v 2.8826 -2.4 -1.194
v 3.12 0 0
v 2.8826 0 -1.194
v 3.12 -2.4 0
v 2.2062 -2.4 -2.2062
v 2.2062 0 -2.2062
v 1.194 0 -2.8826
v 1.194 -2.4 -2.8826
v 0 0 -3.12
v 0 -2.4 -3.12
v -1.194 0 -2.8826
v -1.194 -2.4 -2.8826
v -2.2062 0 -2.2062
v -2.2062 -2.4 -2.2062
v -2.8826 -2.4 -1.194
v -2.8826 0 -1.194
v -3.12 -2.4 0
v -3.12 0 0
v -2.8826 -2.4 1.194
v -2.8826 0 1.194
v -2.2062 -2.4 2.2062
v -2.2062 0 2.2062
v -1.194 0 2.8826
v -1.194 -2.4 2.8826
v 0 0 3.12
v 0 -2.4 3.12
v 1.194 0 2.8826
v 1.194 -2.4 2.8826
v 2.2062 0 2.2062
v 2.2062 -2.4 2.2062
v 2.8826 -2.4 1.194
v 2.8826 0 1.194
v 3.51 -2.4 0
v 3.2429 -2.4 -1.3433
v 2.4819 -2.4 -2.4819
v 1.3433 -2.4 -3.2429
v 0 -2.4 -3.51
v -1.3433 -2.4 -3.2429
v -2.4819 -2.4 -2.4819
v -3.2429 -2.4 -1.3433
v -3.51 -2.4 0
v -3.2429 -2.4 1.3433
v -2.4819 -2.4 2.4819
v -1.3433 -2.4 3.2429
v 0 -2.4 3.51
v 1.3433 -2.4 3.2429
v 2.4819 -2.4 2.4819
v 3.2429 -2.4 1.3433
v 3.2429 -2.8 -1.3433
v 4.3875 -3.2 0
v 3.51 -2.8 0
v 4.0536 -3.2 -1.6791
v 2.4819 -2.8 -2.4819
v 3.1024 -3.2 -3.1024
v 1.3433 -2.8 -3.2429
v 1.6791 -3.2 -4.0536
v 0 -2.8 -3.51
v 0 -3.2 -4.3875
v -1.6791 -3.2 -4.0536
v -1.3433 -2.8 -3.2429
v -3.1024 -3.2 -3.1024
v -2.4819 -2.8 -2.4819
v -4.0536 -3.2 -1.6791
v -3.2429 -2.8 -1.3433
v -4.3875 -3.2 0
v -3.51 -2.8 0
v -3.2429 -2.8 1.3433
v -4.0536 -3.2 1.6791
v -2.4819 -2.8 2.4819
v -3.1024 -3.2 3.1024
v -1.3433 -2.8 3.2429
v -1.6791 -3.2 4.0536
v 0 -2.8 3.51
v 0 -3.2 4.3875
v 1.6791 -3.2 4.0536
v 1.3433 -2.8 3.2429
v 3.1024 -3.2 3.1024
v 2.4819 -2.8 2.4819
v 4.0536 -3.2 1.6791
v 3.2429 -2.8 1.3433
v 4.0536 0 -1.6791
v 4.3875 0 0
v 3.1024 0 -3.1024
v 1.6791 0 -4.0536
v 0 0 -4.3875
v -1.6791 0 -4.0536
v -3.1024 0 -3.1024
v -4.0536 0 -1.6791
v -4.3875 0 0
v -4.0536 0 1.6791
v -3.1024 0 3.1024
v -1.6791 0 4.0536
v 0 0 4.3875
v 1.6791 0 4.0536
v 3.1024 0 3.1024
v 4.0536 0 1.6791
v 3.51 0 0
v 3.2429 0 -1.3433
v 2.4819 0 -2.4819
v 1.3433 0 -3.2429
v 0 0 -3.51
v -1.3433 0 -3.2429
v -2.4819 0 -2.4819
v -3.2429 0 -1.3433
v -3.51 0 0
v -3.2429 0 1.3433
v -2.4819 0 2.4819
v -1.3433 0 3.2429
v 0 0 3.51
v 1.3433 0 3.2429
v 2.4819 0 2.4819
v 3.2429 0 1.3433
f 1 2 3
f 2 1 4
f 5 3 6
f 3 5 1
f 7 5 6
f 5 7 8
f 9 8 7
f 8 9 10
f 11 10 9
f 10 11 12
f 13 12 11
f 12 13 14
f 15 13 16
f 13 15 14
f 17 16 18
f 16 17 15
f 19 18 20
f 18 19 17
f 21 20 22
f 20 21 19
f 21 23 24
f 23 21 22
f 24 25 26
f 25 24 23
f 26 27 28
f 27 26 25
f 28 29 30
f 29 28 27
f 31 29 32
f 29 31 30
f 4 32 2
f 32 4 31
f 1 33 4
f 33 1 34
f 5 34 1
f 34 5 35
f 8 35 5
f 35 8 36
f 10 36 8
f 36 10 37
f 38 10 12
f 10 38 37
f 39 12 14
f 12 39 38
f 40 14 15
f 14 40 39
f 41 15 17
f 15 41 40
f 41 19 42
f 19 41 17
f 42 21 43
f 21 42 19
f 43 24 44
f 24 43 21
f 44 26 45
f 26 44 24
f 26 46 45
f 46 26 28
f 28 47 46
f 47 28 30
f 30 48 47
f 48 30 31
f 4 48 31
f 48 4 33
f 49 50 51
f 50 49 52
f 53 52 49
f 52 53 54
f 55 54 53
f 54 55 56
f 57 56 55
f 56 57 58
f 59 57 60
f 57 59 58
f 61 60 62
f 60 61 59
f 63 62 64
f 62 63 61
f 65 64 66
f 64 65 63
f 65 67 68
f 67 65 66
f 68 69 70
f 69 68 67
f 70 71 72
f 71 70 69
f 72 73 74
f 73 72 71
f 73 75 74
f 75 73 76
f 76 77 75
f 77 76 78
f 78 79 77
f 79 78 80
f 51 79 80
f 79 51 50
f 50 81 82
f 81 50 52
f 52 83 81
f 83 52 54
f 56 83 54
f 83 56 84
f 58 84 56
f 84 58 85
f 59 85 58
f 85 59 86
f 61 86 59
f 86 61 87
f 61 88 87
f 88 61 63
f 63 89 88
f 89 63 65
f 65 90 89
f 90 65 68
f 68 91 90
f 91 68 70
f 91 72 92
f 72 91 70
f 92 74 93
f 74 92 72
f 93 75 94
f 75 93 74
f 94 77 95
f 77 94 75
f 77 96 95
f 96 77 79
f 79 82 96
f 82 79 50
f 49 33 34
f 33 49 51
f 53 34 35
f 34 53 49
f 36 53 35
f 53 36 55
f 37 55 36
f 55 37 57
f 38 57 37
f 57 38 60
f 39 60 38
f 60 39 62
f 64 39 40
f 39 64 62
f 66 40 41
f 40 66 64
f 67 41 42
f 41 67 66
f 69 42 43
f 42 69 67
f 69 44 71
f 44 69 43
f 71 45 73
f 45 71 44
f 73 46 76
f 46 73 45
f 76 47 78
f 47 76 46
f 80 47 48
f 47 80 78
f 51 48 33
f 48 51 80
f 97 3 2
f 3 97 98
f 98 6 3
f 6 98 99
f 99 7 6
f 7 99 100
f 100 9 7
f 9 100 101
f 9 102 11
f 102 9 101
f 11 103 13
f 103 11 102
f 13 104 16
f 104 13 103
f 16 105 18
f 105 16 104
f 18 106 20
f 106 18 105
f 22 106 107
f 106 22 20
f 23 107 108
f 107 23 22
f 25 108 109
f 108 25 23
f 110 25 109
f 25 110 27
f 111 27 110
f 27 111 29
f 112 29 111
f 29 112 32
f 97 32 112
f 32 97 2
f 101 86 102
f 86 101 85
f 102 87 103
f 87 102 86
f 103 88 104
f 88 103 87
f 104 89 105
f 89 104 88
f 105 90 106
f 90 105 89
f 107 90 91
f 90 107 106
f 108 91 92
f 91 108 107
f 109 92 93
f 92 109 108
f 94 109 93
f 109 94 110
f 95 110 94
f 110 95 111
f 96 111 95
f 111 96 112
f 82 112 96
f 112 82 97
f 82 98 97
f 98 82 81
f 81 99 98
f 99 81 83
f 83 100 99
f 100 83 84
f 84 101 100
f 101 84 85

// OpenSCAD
// file: ../p/4-4disc.scad
use <../lib.scad>
$fa=1; $fs=0.2;
function ldraw_lib__4_4disc(realsolid=false) = [
// 0 Disc 1.0
// 0 Name: 4-4disc.dat
// 0 Author: James Jessiman
// 0 !LDRAW_ORG Primitive UPDATE 2002-02
// 0 !LICENSE Licensed under CC BY 2.0 and CC BY 4.0 : see CAreadme.txt
// 
// 0 BFC CERTIFY CCW
  [0,"BFC","CERTIFY"],
  [0,"BFC","CCW"],
// 
// 0 !HISTORY 1998-12-15 [PTadmin] Official Update 1998-10
// 0 !HISTORY 2002-03-23 [sbliss] Added BFC statement
// 0 !HISTORY 2002-04-25 [PTadmin] Official Update 2002-02
// 0 !HISTORY 2007-06-24 [PTadmin] Header formatted for Contributor Agreement
// 0 !HISTORY 2008-07-01 [PTadmin] Official Update 2008-01
// 
// 
// 3 16 0 0 0 1 0 0 0.9239 0 0.3827
  [3,16,0,0,0,1,0,0,0.9239,0,0.3827],
// 3 16 0 0 0 0.9239 0 0.3827 0.7071 0 0.7071
  [3,16,0,0,0,0.9239,0,0.3827,0.7071,0,0.7071],
// 3 16 0 0 0 0.7071 0 0.7071 0.3827 0 0.9239
  [3,16,0,0,0,0.7071,0,0.7071,0.3827,0,0.9239],
// 3 16 0 0 0 0.3827 0 0.9239 0 0 1
  [3,16,0,0,0,0.3827,0,0.9239,0,0,1],
// 3 16 0 0 0 0 0 1 -0.3827 0 0.9239
  [3,16,0,0,0,0,0,1,-0.3827,0,0.9239],
// 3 16 0 0 0 -0.3827 0 0.9239 -0.7071 0 0.7071
  [3,16,0,0,0,-0.3827,0,0.9239,-0.7071,0,0.7071],
// 3 16 0 0 0 -0.7071 0 0.7071 -0.9239 0 0.3827
  [3,16,0,0,0,-0.7071,0,0.7071,-0.9239,0,0.3827],
// 3 16 0 0 0 -0.9239 0 0.3827 -1 0 -0
  [3,16,0,0,0,-0.9239,0,0.3827,-1,0,-0],
// 3 16 0 0 0 -1 0 -0 -0.9239 0 -0.3827
  [3,16,0,0,0,-1,0,-0,-0.9239,0,-0.3827],
// 3 16 0 0 0 -0.9239 0 -0.3827 -0.7071 0 -0.7071
  [3,16,0,0,0,-0.9239,0,-0.3827,-0.7071,0,-0.7071],
// 3 16 0 0 0 -0.7071 0 -0.7071 -0.3827 0 -0.9239
  [3,16,0,0,0,-0.7071,0,-0.7071,-0.3827,0,-0.9239],
// 3 16 0 0 0 -0.3827 0 -0.9239 0 0 -1
  [3,16,0,0,0,-0.3827,0,-0.9239,0,0,-1],
// 3 16 0 0 0 0 0 -1 0.3827 0 -0.9239
  [3,16,0,0,0,0,0,-1,0.3827,0,-0.9239],
// 3 16 0 0 0 0.3827 0 -0.9239 0.7071 0 -0.7071
  [3,16,0,0,0,0.3827,0,-0.9239,0.7071,0,-0.7071],
// 3 16 0 0 0 0.7071 0 -0.7071 0.9239 0 -0.3827
  [3,16,0,0,0,0.7071,0,-0.7071,0.9239,0,-0.3827],
// 3 16 0 0 0 0.9239 0 -0.3827 1 0 0
  [3,16,0,0,0,0.9239,0,-0.3827,1,0,0],
// 0
];
module ldraw_lib__4_4disc(step=0, col=false, unit=2/5, alt=false, line=0.2, solid=!$preview)
    makepoly(ldraw_lib__4_4disc(solid), step=step, col=col, unit=unit, alt=alt, line=line, solid=solid);
ldraw_lib__4_4disc(line=0.2);
// file: ../p/stud3.scad
use <../lib.scad>
use <4-4cyli.scad>
use <4-4disc.scad>
use <4-4edge.scad>
$fa=1; $fs=0.2;
function ldraw_lib__stud3(realsolid=false) = realsolid ? 
    [openscad(translate([0,0,-eps()], o=cylinder(4+eps(), r=4)),2)] : [
// 0 Stud Tube Solid
// 0 Name: stud3.dat
// 0 Author: James Jessiman
// 0 !LDRAW_ORG Primitive UPDATE 2012-01
// 0 !LICENSE Licensed under CC BY 2.0 and CC BY 4.0 : see CAreadme.txt
// 
// 0 BFC CERTIFY CCW
  [0,"BFC","CERTIFY"],
  [0,"BFC","CCW"],
// 
// 0 !HISTORY 2002-04-04 [sbliss] Modified for BFC compliance
// 0 !HISTORY 2002-04-25 [PTadmin] Official Update 2002-02
// 0 !HISTORY 2007-06-24 [PTadmin] Header formatted for Contributor Agreement
// 0 !HISTORY 2008-07-01 [PTadmin] Official Update 2008-01
// 0 !HISTORY 2012-02-16 [Philo] Changed to CCW
// 0 !HISTORY 2012-03-30 [PTadmin] Official Update 2012-01
// 
// 
// 1 16 0 -4 0 4 0 0 0 1 0 0 0 4 4-4edge.dat
  [1,16,0,-4,0,4,0,0,0,1,0,0,0,4, ldraw_lib__4_4edge(realsolid)],
// 1 16 0 0 0 4 0 0 0 1 0 0 0 4 4-4edge.dat
  [1,16,0,0,0,4,0,0,0,1,0,0,0,4, ldraw_lib__4_4edge(realsolid)],
// 1 16 0 -4 0 4 0 0 0 1 0 0 0 4 4-4disc.dat
  [1,16,0,-4,0,4,0,0,0,1,0,0,0,4, ldraw_lib__4_4disc(realsolid)],
// 1 16 0 -4 0 4 0 0 0 4 0 0 0 4 4-4cyli.dat
  [1,16,0,-4,0,4,0,0,0,4,0,0,0,4, ldraw_lib__4_4cyli(realsolid)],
];
module ldraw_lib__stud3(step=0, col=false, unit=2/5, alt=false, line=0.2, solid=!$preview)
    makepoly(ldraw_lib__stud3(solid), step=step, col=col, unit=unit, alt=alt, line=line, solid=solid);
ldraw_lib__stud3(line=0.2);
// file: ../p/stud.scad
use <../lib.scad>
use <4-4cyli.scad>
use <4-4disc.scad>
use <4-4edge.scad>
$fa=1; $fs=0.2;
function ldraw_lib__stud(realsolid=false) = realsolid ? 
    [openscad(translate([0,0,-eps()], o=cylinder(4+eps(), r=6)),2)] : [
// 0 Stud
// 0 Name: stud.dat
// 0 Author: James Jessiman
// 0 !LDRAW_ORG Primitive UPDATE 2012-01
// 0 !LICENSE Licensed under CC BY 2.0 and CC BY 4.0 : see CAreadme.txt
// 
// 0 BFC CERTIFY CCW
  [0,"BFC","CERTIFY"],
  [0,"BFC","CCW"],
// 
// 0 !HISTORY 2002-04-04 [sbliss] Modified for BFC compliance
// 0 !HISTORY 2002-04-25 [PTadmin] Official Update 2002-02
// 0 !HISTORY 2007-06-24 [PTadmin] Header formatted for Contributor Agreement
// 0 !HISTORY 2008-07-01 [PTadmin] Official Update 2008-01
// 0 !HISTORY 2012-02-16 [Philo] Changed to CCW
// 0 !HISTORY 2012-03-30 [PTadmin] Official Update 2012-01
// 
// 
// 1 16 0 0 0 6 0 0 0 1 0 0 0 6 4-4edge.dat
  [1,16,0,0,0,6,0,0,0,1,0,0,0,6, ldraw_lib__4_4edge(realsolid)],
// 1 16 0 -4 0 6 0 0 0 1 0 0 0 6 4-4edge.dat
  [1,16,0,-4,0,6,0,0,0,1,0,0,0,6, ldraw_lib__4_4edge(realsolid)],
// 1 16 0 0 0 6 0 0 0 -4 0 0 0 6 4-4cyli.dat
  [1,16,0,0,0,6,0,0,0,-4,0,0,0,6, ldraw_lib__4_4cyli(realsolid)],
// 1 16 0 -4 0 6 0 0 0 1 0 0 0 6 4-4disc.dat
  [1,16,0,-4,0,6,0,0,0,1,0,0,0,6, ldraw_lib__4_4disc(realsolid)],
];
module ldraw_lib__stud(step=0, col=false, unit=2/5, alt=false, line=0.2, solid=!$preview)
    makepoly(ldraw_lib__stud(solid), step=step, col=col, unit=unit, alt=alt, line=line, solid=solid);
ldraw_lib__stud(line=0.2);
// file: ../p/box5.scad
use <../lib.scad>
$fa=1; $fs=0.2;
function ldraw_lib__box5(realsolid=false) = [
// 0 Box with 5 Faces and All Edges
// 0 Name: box5.dat
// 0 Author: James Jessiman
// 0 !LDRAW_ORG Primitive UPDATE 2012-01
// 0 !LICENSE Licensed under CC BY 2.0 and CC BY 4.0 : see CAreadme.txt
// 
// 0 BFC CERTIFY CCW
  [0,"BFC","CERTIFY"],
  [0,"BFC","CCW"],
// 
// 0 !HISTORY 2002-04-03 [sbliss] Modified for BFC compliance
// 0 !HISTORY 2002-04-25 [PTadmin] Official Update 2002-02
// 0 !HISTORY 2007-06-24 [PTadmin] Header formatted for Contributor Agreement
// 0 !HISTORY 2008-07-01 [PTadmin] Official Update 2008-01
// 0 !HISTORY 2012-02-16 [Philo] Changed to CCW
// 0 !HISTORY 2012-03-30 [PTadmin] Official Update 2012-01
// 
// 
// 2 24 1 1 1 -1 1 1
  [2,24,1,1,1,-1,1,1],
// 2 24 -1 1 1 -1 1 -1
  [2,24,-1,1,1,-1,1,-1],
// 2 24 -1 1 -1 1 1 -1
  [2,24,-1,1,-1,1,1,-1],
// 2 24 1 1 -1 1 1 1
  [2,24,1,1,-1,1,1,1],
// 2 24 1 0 1 -1 0 1
  [2,24,1,0,1,-1,0,1],
// 2 24 -1 0 1 -1 0 -1
  [2,24,-1,0,1,-1,0,-1],
// 2 24 -1 0 -1 1 0 -1
  [2,24,-1,0,-1,1,0,-1],
// 2 24 1 0 -1 1 0 1
  [2,24,1,0,-1,1,0,1],
// 2 24 1 0 1 1 1 1
  [2,24,1,0,1,1,1,1],
// 2 24 -1 0 1 -1 1 1
  [2,24,-1,0,1,-1,1,1],
// 2 24 1 0 -1 1 1 -1
  [2,24,1,0,-1,1,1,-1],
// 2 24 -1 0 -1 -1 1 -1
  [2,24,-1,0,-1,-1,1,-1],
// 4 16 -1 1 1 1 1 1 1 1 -1 -1 1 -1
  [4,16,-1,1,1,1,1,1,1,1,-1,-1,1,-1],
// 4 16 -1 1 1 -1 0 1 1 0 1 1 1 1
  [4,16,-1,1,1,-1,0,1,1,0,1,1,1,1],
// 4 16 -1 1 -1 -1 0 -1 -1 0 1 -1 1 1
  [4,16,-1,1,-1,-1,0,-1,-1,0,1,-1,1,1],
// 4 16 1 1 -1 1 0 -1 -1 0 -1 -1 1 -1
  [4,16,1,1,-1,1,0,-1,-1,0,-1,-1,1,-1],
// 4 16 1 1 1 1 0 1 1 0 -1 1 1 -1
  [4,16,1,1,1,1,0,1,1,0,-1,1,1,-1],
];
module ldraw_lib__box5(step=0, col=false, unit=2/5, alt=false, line=0.2, solid=!$preview)
    makepoly(ldraw_lib__box5(solid), step=step, col=col, unit=unit, alt=alt, line=line, solid=solid);
ldraw_lib__box5(line=0.2);
// file: ../p/box4t.scad
use <../lib.scad>
$fa=1; $fs=0.2;
function ldraw_lib__box4t(realsolid=false) = [
// 0 Box with 4 Adjacent Faces and All Edges
// 0 Name: box4t.dat
// 0 Author: Tore Eriksson [Tore_Eriksson]
// 0 !LDRAW_ORG Primitive UPDATE 2003-02
// 0 !LICENSE Licensed under CC BY 2.0 and CC BY 4.0 : see CAreadme.txt
// 
// 0 BFC CERTIFY CCW
  [0,"BFC","CERTIFY"],
  [0,"BFC","CCW"],
// 
// 0 !HISTORY 1997-09-29 [PTadmin] Official Update 1997-15
// 0 !HISTORY 2002-08-31 [izanette] Modified with WINDZ for BFC compliance
// 0 !HISTORY 2003-08-01 [PTadmin] Official Update 2003-02
// 0 !HISTORY 2007-06-24 [PTadmin] Header formatted for Contributor Agreement
// 0 !HISTORY 2008-07-01 [PTadmin] Official Update 2008-01
// 
// 
// 2 24 1 1 1 -1 1 1
  [2,24,1,1,1,-1,1,1],
// 2 24 -1 1 1 -1 1 -1
  [2,24,-1,1,1,-1,1,-1],
// 2 24 -1 1 -1 1 1 -1
  [2,24,-1,1,-1,1,1,-1],
// 2 24 1 1 -1 1 1 1
  [2,24,1,1,-1,1,1,1],
// 2 24 1 0 1 -1 0 1
  [2,24,1,0,1,-1,0,1],
// 2 24 -1 0 1 -1 0 -1
  [2,24,-1,0,1,-1,0,-1],
// 2 24 -1 0 -1 1 0 -1
  [2,24,-1,0,-1,1,0,-1],
// 2 24 1 0 -1 1 0 1
  [2,24,1,0,-1,1,0,1],
// 2 24 1 0 1 1 1 1
  [2,24,1,0,1,1,1,1],
// 2 24 -1 0 1 -1 1 1
  [2,24,-1,0,1,-1,1,1],
// 2 24 1 0 -1 1 1 -1
  [2,24,1,0,-1,1,1,-1],
// 2 24 -1 0 -1 -1 1 -1
  [2,24,-1,0,-1,-1,1,-1],
// 4 16 1 1 1 1 1 -1 -1 1 -1 -1 1 1
  [4,16,1,1,1,1,1,-1,-1,1,-1,-1,1,1],
// 4 16 1 1 1 -1 1 1 -1 0 1 1 0 1
  [4,16,1,1,1,-1,1,1,-1,0,1,1,0,1],
// 4 16 -1 1 1 -1 1 -1 -1 0 -1 -1 0 1
  [4,16,-1,1,1,-1,1,-1,-1,0,-1,-1,0,1],
// 0 4 16 -1 1 -1 -1 0 -1 1 0 -1 1 1 -1
// 4 16 1 1 -1 1 1 1 1 0 1 1 0 -1
  [4,16,1,1,-1,1,1,1,1,0,1,1,0,-1],
// 0
];
module ldraw_lib__box4t(step=0, col=false, unit=2/5, alt=false, line=0.2, solid=!$preview)
    makepoly(ldraw_lib__box4t(solid), step=step, col=col, unit=unit, alt=alt, line=line, solid=solid);
ldraw_lib__box4t(line=0.2);
// file: s/3004s01.scad
use <../../lib.scad>
use <../../p/box4t.scad>
use <../../p/box5.scad>
use <../../p/stud.scad>
use <../../p/stud3.scad>
$fa=1; $fs=0.2;
function ldraw_lib__s__3004s01(realsolid=false) = [
// 0 ~Brick  1 x  2 without Front Face
// 0 Name: s\3004s01.dat
// 0 Author: James Jessiman
// 0 !LDRAW_ORG Subpart UPDATE 2003-03
// 0 !LICENSE Licensed under CC BY 2.0 and CC BY 4.0 : see CAreadme.txt
// 
// 0 BFC CERTIFY CCW
  [0,"BFC","CERTIFY"],
  [0,"BFC","CCW"],
// 
// 0 !HISTORY 2003-09-07 [jriley] Subfiling, BFC
// 0 !HISTORY 2003-12-19 [PTadmin] Official Update 2003-03
// 0 !HISTORY 2007-08-29 [PTadmin] Header formatted for Contributor Agreement
// 0 !HISTORY 2008-07-01 [PTadmin] Official Update 2008-01
// 
// 
// 1 16 0 4 0 1 0 0 0 -5 0 0 0 1 stud3.dat
  [1,16,0,4,0,1,0,0,0,-5,0,0,0,1, ldraw_lib__stud3(realsolid)],
// 0 BFC INVERTNEXT
  [0,"BFC","INVERTNEXT"],
// 1 16 0 24 0 16 0 0 0 -20 0 0 0 6 box5.dat
  [1,16,0,24,0,16,0,0,0,-20,0,0,0,6, ldraw_lib__box5(realsolid)],
// 4 16 20 24 10 16 24 6 -16 24 6 -20 24 10
  [4,16,20,24,10,16,24,6,-16,24,6,-20,24,10],
// 4 16 -20 24 10 -16 24 6 -16 24 -6 -20 24 -10
  [4,16,-20,24,10,-16,24,6,-16,24,-6,-20,24,-10],
// 4 16 -20 24 -10 -16 24 -6 16 24 -6 20 24 -10
  [4,16,-20,24,-10,-16,24,-6,16,24,-6,20,24,-10],
// 4 16 20 24 -10 16 24 -6 16 24 6 20 24 10
  [4,16,20,24,-10,16,24,-6,16,24,6,20,24,10],
// 1 16 0 24 0 20 0 0 0 -24 0 0 0 10 box4t.dat
  [1,16,0,24,0,20,0,0,0,-24,0,0,0,10, ldraw_lib__box4t(realsolid)],
// 1 16 10 0 0 1 0 0 0 1 0 0 0 1 stud.dat
  [1,16,10,0,0,1,0,0,0,1,0,0,0,1, ldraw_lib__stud(realsolid)],
// 1 16 -10 0 0 1 0 0 0 1 0 0 0 1 stud.dat
  [1,16,-10,0,0,1,0,0,0,1,0,0,0,1, ldraw_lib__stud(realsolid)],
// 0
];
module ldraw_lib__s__3004s01(step=0, col=false, unit=2/5, alt=false, line=0.2, solid=!$preview)
    makepoly(ldraw_lib__s__3004s01(solid), step=step, col=col, unit=unit, alt=alt, line=line, solid=solid);
ldraw_lib__s__3004s01(line=0.2);
// file: ../p/4-4edge.scad
use <../lib.scad>
$fa=1; $fs=0.2;
function ldraw_lib__4_4edge(realsolid=false) = [
// 0 Circle 1.0
// 0 Name: 4-4edge.dat
// 0 Author: James Jessiman
// 0 !LDRAW_ORG Primitive UPDATE 2017-01
// 0 !LICENSE Licensed under CC BY 2.0 and CC BY 4.0 : see CAreadme.txt
// 
// 0 BFC CERTIFY CCW
  [0,"BFC","CERTIFY"],
  [0,"BFC","CCW"],
// 
// 0 !HISTORY 1998-12-15 [PTadmin] Official Update 1998-10
// 0 !HISTORY 2005-12-28 [PTadmin] Official Update 2005-01
// 0 !HISTORY 2007-06-24 [PTadmin] Header formatted for Contributor Agreement
// 0 !HISTORY 2008-07-01 [PTadmin] Official Update 2008-01
// 0 !HISTORY 2017-01-15 [Steffen] BFCed
// 0 !HISTORY 2017-12-30 [PTadmin] Official Update 2017-01
// 
// 
// 2 24 1 0 0 0.9239 0 0.3827
  [2,24,1,0,0,0.9239,0,0.3827],
// 2 24 0.9239 0 0.3827 0.7071 0 0.7071
  [2,24,0.9239,0,0.3827,0.7071,0,0.7071],
// 2 24 0.7071 0 0.7071 0.3827 0 0.9239
  [2,24,0.7071,0,0.7071,0.3827,0,0.9239],
// 2 24 0.3827 0 0.9239 0 0 1
  [2,24,0.3827,0,0.9239,0,0,1],
// 2 24 0 0 1 -0.3827 0 0.9239
  [2,24,0,0,1,-0.3827,0,0.9239],
// 2 24 -0.3827 0 0.9239 -0.7071 0 0.7071
  [2,24,-0.3827,0,0.9239,-0.7071,0,0.7071],
// 2 24 -0.7071 0 0.7071 -0.9239 0 0.3827
  [2,24,-0.7071,0,0.7071,-0.9239,0,0.3827],
// 2 24 -0.9239 0 0.3827 -1 0 -0
  [2,24,-0.9239,0,0.3827,-1,0,-0],
// 2 24 -1 0 -0 -0.9239 0 -0.3827
  [2,24,-1,0,-0,-0.9239,0,-0.3827],
// 2 24 -0.9239 0 -0.3827 -0.7071 0 -0.7071
  [2,24,-0.9239,0,-0.3827,-0.7071,0,-0.7071],
// 2 24 -0.7071 0 -0.7071 -0.3827 0 -0.9239
  [2,24,-0.7071,0,-0.7071,-0.3827,0,-0.9239],
// 2 24 -0.3827 0 -0.9239 0 0 -1
  [2,24,-0.3827,0,-0.9239,0,0,-1],
// 2 24 0 0 -1 0.3827 0 -0.9239
  [2,24,0,0,-1,0.3827,0,-0.9239],
// 2 24 0.3827 0 -0.9239 0.7071 0 -0.7071
  [2,24,0.3827,0,-0.9239,0.7071,0,-0.7071],
// 2 24 0.7071 0 -0.7071 0.9239 0 -0.3827
  [2,24,0.7071,0,-0.7071,0.9239,0,-0.3827],
// 2 24 0.9239 0 -0.3827 1 0 0
  [2,24,0.9239,0,-0.3827,1,0,0],
];
module ldraw_lib__4_4edge(step=0, col=false, unit=2/5, alt=false, line=0.2, solid=!$preview)
    makepoly(ldraw_lib__4_4edge(solid), step=step, col=col, unit=unit, alt=alt, line=line, solid=solid);
ldraw_lib__4_4edge(line=0.2);
// file: ../p/4-4cyli.scad
use <../lib.scad>
$fa=1; $fs=0.2;
function ldraw_lib__4_4cyli(realsolid=false) = [
// 0 Cylinder 1.0
// 0 Name: 4-4cyli.dat
// 0 Author: James Jessiman
// 0 !LDRAW_ORG Primitive UPDATE 2005-01
// 0 !LICENSE Licensed under CC BY 2.0 and CC BY 4.0 : see CAreadme.txt
// 
// 0 BFC CERTIFY CCW
  [0,"BFC","CERTIFY"],
  [0,"BFC","CCW"],
// 
// 0 !HISTORY 1998-12-15 [PTadmin] Official Update 1998-10
// 0 !HISTORY 2002-03-23 [sbliss] Added BFC statement; merged headers from files in distributions LDraw 0.27 and Complete.
// 0 !HISTORY 2002-04-25 [PTadmin] Official Update 2002-02
// 0 !HISTORY 2004-12-14 [guyvivan] BFC CCW
// 0 !HISTORY 2005-12-28 [PTadmin] Official Update 2005-01
// 0 !HISTORY 2007-06-24 [PTadmin] Header formatted for Contributor Agreement
// 0 !HISTORY 2008-07-01 [PTadmin] Official Update 2008-01
// 
// 
// 4 16 1 1 0 0.9239 1 0.3827 0.9239 0 0.3827 1 0 0
  [4,16,1,1,0,0.9239,1,0.3827,0.9239,0,0.3827,1,0,0],
// 5 24 1 0 0 1 1 0 0.9239 0 0.3827 0.9239 0 -0.3827
  [5,24,1,0,0,1,1,0,0.9239,0,0.3827,0.9239,0,-0.3827],
// 4 16 0.9239 1 0.3827 0.7071 1 0.7071 0.7071 0 0.7071 0.9239 0 0.3827
  [4,16,0.9239,1,0.3827,0.7071,1,0.7071,0.7071,0,0.7071,0.9239,0,0.3827],
// 5 24 0.9239 0 0.3827 0.9239 1 0.3827 0.7071 0 0.7071 1 0 0
  [5,24,0.9239,0,0.3827,0.9239,1,0.3827,0.7071,0,0.7071,1,0,0],
// 4 16 0.7071 1 0.7071 0.3827 1 0.9239 0.3827 0 0.9239 0.7071 0 0.7071
  [4,16,0.7071,1,0.7071,0.3827,1,0.9239,0.3827,0,0.9239,0.7071,0,0.7071],
// 5 24 0.7071 0 0.7071 0.7071 1 0.7071 0.3827 0 0.9239 0.9239 0 0.3827
  [5,24,0.7071,0,0.7071,0.7071,1,0.7071,0.3827,0,0.9239,0.9239,0,0.3827],
// 4 16 0.3827 1 0.9239 0 1 1 0 0 1 0.3827 0 0.9239
  [4,16,0.3827,1,0.9239,0,1,1,0,0,1,0.3827,0,0.9239],
// 5 24 0.3827 0 0.9239 0.3827 1 0.9239 0 0 1 0.7071 0 0.7071
  [5,24,0.3827,0,0.9239,0.3827,1,0.9239,0,0,1,0.7071,0,0.7071],
// 4 16 0 1 1 -0.3827 1 0.9239 -0.3827 0 0.9239 0 0 1
  [4,16,0,1,1,-0.3827,1,0.9239,-0.3827,0,0.9239,0,0,1],
// 5 24 0 0 1 0 1 1 -0.3827 0 0.9239 0.3827 0 0.9239
  [5,24,0,0,1,0,1,1,-0.3827,0,0.9239,0.3827,0,0.9239],
// 4 16 -0.3827 1 0.9239 -0.7071 1 0.7071 -0.7071 0 0.7071 -0.3827 0 0.9239
  [4,16,-0.3827,1,0.9239,-0.7071,1,0.7071,-0.7071,0,0.7071,-0.3827,0,0.9239],
// 5 24 -0.3827 0 0.9239 -0.3827 1 0.9239 -0.7071 0 0.7071 0 0 1
  [5,24,-0.3827,0,0.9239,-0.3827,1,0.9239,-0.7071,0,0.7071,0,0,1],
// 4 16 -0.7071 1 0.7071 -0.9239 1 0.3827 -0.9239 0 0.3827 -0.7071 0 0.7071
  [4,16,-0.7071,1,0.7071,-0.9239,1,0.3827,-0.9239,0,0.3827,-0.7071,0,0.7071],
// 5 24 -0.7071 0 0.7071 -0.7071 1 0.7071 -0.9239 0 0.3827 -0.3827 0 0.9239
  [5,24,-0.7071,0,0.7071,-0.7071,1,0.7071,-0.9239,0,0.3827,-0.3827,0,0.9239],
// 4 16 -0.9239 1 0.3827 -1 1 0 -1 0 0 -0.9239 0 0.3827
  [4,16,-0.9239,1,0.3827,-1,1,0,-1,0,0,-0.9239,0,0.3827],
// 5 24 -0.9239 0 0.3827 -0.9239 1 0.3827 -1 0 0 -0.7071 0 0.7071
  [5,24,-0.9239,0,0.3827,-0.9239,1,0.3827,-1,0,0,-0.7071,0,0.7071],
// 4 16 -1 1 0 -0.9239 1 -0.3827 -0.9239 0 -0.3827 -1 0 0
  [4,16,-1,1,0,-0.9239,1,-0.3827,-0.9239,0,-0.3827,-1,0,0],
// 5 24 -1 0 0 -1 1 0 -0.9239 0 -0.3827 -0.9239 0 0.3827
  [5,24,-1,0,0,-1,1,0,-0.9239,0,-0.3827,-0.9239,0,0.3827],
// 4 16 -0.9239 1 -0.3827 -0.7071 1 -0.7071 -0.7071 0 -0.7071 -0.9239 0 -0.3827
  [4,16,-0.9239,1,-0.3827,-0.7071,1,-0.7071,-0.7071,0,-0.7071,-0.9239,0,-0.3827],
// 5 24 -0.9239 0 -0.3827 -0.9239 1 -0.3827 -0.7071 0 -0.7071 -1 0 0
  [5,24,-0.9239,0,-0.3827,-0.9239,1,-0.3827,-0.7071,0,-0.7071,-1,0,0],
// 4 16 -0.7071 1 -0.7071 -0.3827 1 -0.9239 -0.3827 0 -0.9239 -0.7071 0 -0.7071
  [4,16,-0.7071,1,-0.7071,-0.3827,1,-0.9239,-0.3827,0,-0.9239,-0.7071,0,-0.7071],
// 5 24 -0.7071 0 -0.7071 -0.7071 1 -0.7071 -0.3827 0 -0.9239 -0.9239 0 -0.3827
  [5,24,-0.7071,0,-0.7071,-0.7071,1,-0.7071,-0.3827,0,-0.9239,-0.9239,0,-0.3827],
// 4 16 -0.3827 1 -0.9239 0 1 -1 0 0 -1 -0.3827 0 -0.9239
  [4,16,-0.3827,1,-0.9239,0,1,-1,0,0,-1,-0.3827,0,-0.9239],
// 5 24 -0.3827 0 -0.9239 -0.3827 1 -0.9239 0 0 -1 -0.7071 0 -0.7071
  [5,24,-0.3827,0,-0.9239,-0.3827,1,-0.9239,0,0,-1,-0.7071,0,-0.7071],
// 4 16 0 1 -1 0.3827 1 -0.9239 0.3827 0 -0.9239 0 0 -1
  [4,16,0,1,-1,0.3827,1,-0.9239,0.3827,0,-0.9239,0,0,-1],
// 5 24 0 0 -1 0 1 -1 0.3827 0 -0.9239 -0.3827 0 -0.9239
  [5,24,0,0,-1,0,1,-1,0.3827,0,-0.9239,-0.3827,0,-0.9239],
// 4 16 0.3827 1 -0.9239 0.7071 1 -0.7071 0.7071 0 -0.7071 0.3827 0 -0.9239
  [4,16,0.3827,1,-0.9239,0.7071,1,-0.7071,0.7071,0,-0.7071,0.3827,0,-0.9239],
// 5 24 0.3827 0 -0.9239 0.3827 1 -0.9239 0.7071 0 -0.7071 0 0 -1
  [5,24,0.3827,0,-0.9239,0.3827,1,-0.9239,0.7071,0,-0.7071,0,0,-1],
// 4 16 0.7071 1 -0.7071 0.9239 1 -0.3827 0.9239 0 -0.3827 0.7071 0 -0.7071
  [4,16,0.7071,1,-0.7071,0.9239,1,-0.3827,0.9239,0,-0.3827,0.7071,0,-0.7071],
// 5 24 0.7071 0 -0.7071 0.7071 1 -0.7071 0.9239 0 -0.3827 0.3827 0 -0.9239
  [5,24,0.7071,0,-0.7071,0.7071,1,-0.7071,0.9239,0,-0.3827,0.3827,0,-0.9239],
// 4 16 0.9239 1 -0.3827 1 1 0 1 0 0 0.9239 0 -0.3827
  [4,16,0.9239,1,-0.3827,1,1,0,1,0,0,0.9239,0,-0.3827],
// 5 24 0.9239 0 -0.3827 0.9239 1 -0.3827 1 0 0 0.7071 0 -0.7071
  [5,24,0.9239,0,-0.3827,0.9239,1,-0.3827,1,0,0,0.7071,0,-0.7071],
// 0
];
module ldraw_lib__4_4cyli(step=0, col=false, unit=2/5, alt=false, line=0.2, solid=!$preview)
    makepoly(ldraw_lib__4_4cyli(solid), step=step, col=col, unit=unit, alt=alt, line=line, solid=solid);
ldraw_lib__4_4cyli(line=0.2);
// file: 3004.scad
use <../lib.scad>
use <s/3004s01.scad>
$fa=1; $fs=0.2;
function ldraw_lib__3004(realsolid=false) = [
// 0 Brick  1 x  2
// 0 Name: 3004.dat
// 0 Author: James Jessiman
// 0 !LDRAW_ORG Part UPDATE 2022-05
// 0 !LICENSE Licensed under CC BY 2.0 and CC BY 4.0 : see CAreadme.txt
// 
// 0 BFC CERTIFY CCW
  [0,"BFC","CERTIFY"],
  [0,"BFC","CCW"],
// 
// 0 !HISTORY 2001-10-26 [PTadmin] Official Update 2001-01
// 0 !HISTORY 2002-05-07 {unknown} BFC Certification
// 0 !HISTORY 2002-06-11 [PTadmin] Official Update 2002-03
// 0 !HISTORY 2007-05-07 [PTadmin] Header formatted for Contributor Agreement
// 0 !HISTORY 2008-07-01 [PTadmin] Official Update 2008-01
// 0 !HISTORY 2022-08-04 [MagFors] Using subfile
// 0 !HISTORY 2022-09-15 [PTadmin] Official Update 2022-05
// 
// 
// 1 16 0 0 0 1 0 0 0 1 0 0 0 1 s\3004s01.dat
  [1,16,0,0,0,1,0,0,0,1,0,0,0,1, ldraw_lib__s__3004s01(realsolid)],
// 4 16 -20 24 -10 20 24 -10 20 0 -10 -20 0 -10
  [4,16,-20,24,-10,20,24,-10,20,0,-10,-20,0,-10],
];
module ldraw_lib__3004(step=0, col=false, unit=2/5, alt=false, line=0.2, solid=!$preview)
    makepoly(ldraw_lib__3004(solid), step=step, col=col, unit=unit, alt=alt, line=line, solid=solid);
ldraw_lib__3004(line=0.2);
// file: ../p/4-4ring8.scad
use <../lib.scad>
$fa=1; $fs=0.2;
function ldraw_lib__4_4ring8(realsolid=false) = [
// 0 Ring  8 x 1.0
// 0 Name: 4-4ring8.dat
// 0 Author: Steffen [Steffen]
// 0 !LDRAW_ORG Primitive UPDATE 2012-01
// 0 !LICENSE Licensed under CC BY 2.0 and CC BY 4.0 : see CAreadme.txt
// 
// 0 BFC CERTIFY CCW
  [0,"BFC","CERTIFY"],
  [0,"BFC","CCW"],
// 
// 0 !HISTORY 2003-12-19 [PTadmin] Official Update 2003-03
// 0 !HISTORY 2007-06-24 [PTadmin] Header formatted for Contributor Agreement
// 0 !HISTORY 2008-07-01 [PTadmin] Official Update 2008-01
// 0 !HISTORY 2012-02-16 [Philo] Changed to CCW
// 0 !HISTORY 2012-03-30 [PTadmin] Official Update 2012-01
// 
// 
// 4 16 9 0 0 8.3151 0 3.4443 7.3912 0 3.0616 8 0 0
  [4,16,9,0,0,8.3151,0,3.4443,7.3912,0,3.0616,8,0,0],
// 4 16 8.3151 0 3.4443 6.3639 0 6.3639 5.6568 0 5.6568 7.3912 0 3.0616
  [4,16,8.3151,0,3.4443,6.3639,0,6.3639,5.6568,0,5.6568,7.3912,0,3.0616],
// 4 16 6.3639 0 6.3639 3.4443 0 8.3151 3.0616 0 7.3912 5.6568 0 5.6568
  [4,16,6.3639,0,6.3639,3.4443,0,8.3151,3.0616,0,7.3912,5.6568,0,5.6568],
// 4 16 3.4443 0 8.3151 0 0 9 0 0 8 3.0616 0 7.3912
  [4,16,3.4443,0,8.3151,0,0,9,0,0,8,3.0616,0,7.3912],
// 4 16 0 0 9 -3.4443 0 8.3151 -3.0616 0 7.3912 0 0 8
  [4,16,0,0,9,-3.4443,0,8.3151,-3.0616,0,7.3912,0,0,8],
// 4 16 -3.4443 0 8.3151 -6.3639 0 6.3639 -5.6568 0 5.6568 -3.0616 0 7.3912
  [4,16,-3.4443,0,8.3151,-6.3639,0,6.3639,-5.6568,0,5.6568,-3.0616,0,7.3912],
// 4 16 -6.3639 0 6.3639 -8.3151 0 3.4443 -7.3912 0 3.0616 -5.6568 0 5.6568
  [4,16,-6.3639,0,6.3639,-8.3151,0,3.4443,-7.3912,0,3.0616,-5.6568,0,5.6568],
// 4 16 -8.3151 0 3.4443 -9 0 0 -8 0 0 -7.3912 0 3.0616
  [4,16,-8.3151,0,3.4443,-9,0,0,-8,0,0,-7.3912,0,3.0616],
// 4 16 -9 0 0 -8.3151 0 -3.4443 -7.3912 0 -3.0616 -8 0 0
  [4,16,-9,0,0,-8.3151,0,-3.4443,-7.3912,0,-3.0616,-8,0,0],
// 4 16 -8.3151 0 -3.4443 -6.3639 0 -6.3639 -5.6568 0 -5.6568 -7.3912 0 -3.0616
  [4,16,-8.3151,0,-3.4443,-6.3639,0,-6.3639,-5.6568,0,-5.6568,-7.3912,0,-3.0616],
// 4 16 -6.3639 0 -6.3639 -3.4443 0 -8.3151 -3.0616 0 -7.3912 -5.6568 0 -5.6568
  [4,16,-6.3639,0,-6.3639,-3.4443,0,-8.3151,-3.0616,0,-7.3912,-5.6568,0,-5.6568],
// 4 16 -3.4443 0 -8.3151 0 0 -9 0 0 -8 -3.0616 0 -7.3912
  [4,16,-3.4443,0,-8.3151,0,0,-9,0,0,-8,-3.0616,0,-7.3912],
// 4 16 0 0 -9 3.4443 0 -8.3151 3.0616 0 -7.3912 0 0 -8
  [4,16,0,0,-9,3.4443,0,-8.3151,3.0616,0,-7.3912,0,0,-8],
// 4 16 3.4443 0 -8.3151 6.3639 0 -6.3639 5.6568 0 -5.6568 3.0616 0 -7.3912
  [4,16,3.4443,0,-8.3151,6.3639,0,-6.3639,5.6568,0,-5.6568,3.0616,0,-7.3912],
// 4 16 6.3639 0 -6.3639 8.3151 0 -3.4443 7.3912 0 -3.0616 5.6568 0 -5.6568
  [4,16,6.3639,0,-6.3639,8.3151,0,-3.4443,7.3912,0,-3.0616,5.6568,0,-5.6568],
// 4 16 8.3151 0 -3.4443 9 0 0 8 0 0 7.3912 0 -3.0616
  [4,16,8.3151,0,-3.4443,9,0,0,8,0,0,7.3912,0,-3.0616],
];
module ldraw_lib__4_4ring8(step=0, col=false, unit=2/5, alt=false, line=0.2, solid=!$preview)
    makepoly(ldraw_lib__4_4ring8(solid), step=step, col=col, unit=unit, alt=alt, line=line, solid=solid);
ldraw_lib__4_4ring8(line=0.2);
// file: ../p/4-4ring4.scad
use <../lib.scad>
$fa=1; $fs=0.2;
function ldraw_lib__4_4ring4(realsolid=false) = [
// 0 Ring  4 x 1.0
// 0 Name: 4-4ring4.dat
// 0 Author: James Jessiman
// 0 !LDRAW_ORG Primitive UPDATE 2009-01
// 0 !LICENSE Licensed under CC BY 2.0 and CC BY 4.0 : see CAreadme.txt
// 
// 0 BFC CERTIFY CCW
  [0,"BFC","CERTIFY"],
  [0,"BFC","CCW"],
// 
// 0 !HISTORY 1998-12-15 [PTadmin] Official Update 1998-10
// 0 !HISTORY 2002-04-08 [BrickCaster] Modified for BFC compliance
// 0 !HISTORY 2002-04-25 [PTadmin] Official Update 2002-02
// 0 !HISTORY 2007-06-24 [PTadmin] Header formatted for Contributor Agreement
// 0 !HISTORY 2008-07-01 [PTadmin] Official Update 2008-01
// 0 !HISTORY 2008-08-26 [cwdee] Switch polygon winding and rename
// 0 !HISTORY 2009-05-02 [PTadmin] Official Update 2009-01
// 
// 
// 4 16 -1.9135 0 4.6195 -1.5308 0 3.6956 0 0 4 0 0 5
  [4,16,-1.9135,0,4.6195,-1.5308,0,3.6956,0,0,4,0,0,5],
// 4 16 -3.5355 0 3.5355 -2.8284 0 2.8284 -1.5308 0 3.6956 -1.9135 0 4.6195
  [4,16,-3.5355,0,3.5355,-2.8284,0,2.8284,-1.5308,0,3.6956,-1.9135,0,4.6195],
// 4 16 -4.6195 0 1.9135 -3.6956 0 1.5308 -2.8284 0 2.8284 -3.5355 0 3.5355
  [4,16,-4.6195,0,1.9135,-3.6956,0,1.5308,-2.8284,0,2.8284,-3.5355,0,3.5355],
// 4 16 -5 0 0 -4 0 0 -3.6956 0 1.5308 -4.6195 0 1.9135
  [4,16,-5,0,0,-4,0,0,-3.6956,0,1.5308,-4.6195,0,1.9135],
// 4 16 -4.6195 0 -1.9135 -3.6956 0 -1.5308 -4 0 0 -5 0 0
  [4,16,-4.6195,0,-1.9135,-3.6956,0,-1.5308,-4,0,0,-5,0,0],
// 4 16 -3.5355 0 -3.5355 -2.8284 0 -2.8284 -3.6956 0 -1.5308 -4.6195 0 -1.9135
  [4,16,-3.5355,0,-3.5355,-2.8284,0,-2.8284,-3.6956,0,-1.5308,-4.6195,0,-1.9135],
// 4 16 -1.9135 0 -4.6195 -1.5308 0 -3.6956 -2.8284 0 -2.8284 -3.5355 0 -3.5355
  [4,16,-1.9135,0,-4.6195,-1.5308,0,-3.6956,-2.8284,0,-2.8284,-3.5355,0,-3.5355],
// 4 16 0 0 -5 0 0 -4 -1.5308 0 -3.6956 -1.9135 0 -4.6195
  [4,16,0,0,-5,0,0,-4,-1.5308,0,-3.6956,-1.9135,0,-4.6195],
// 4 16 1.9135 0 -4.6195 1.5308 0 -3.6956 0 0 -4 0 0 -5
  [4,16,1.9135,0,-4.6195,1.5308,0,-3.6956,0,0,-4,0,0,-5],
// 4 16 3.5355 0 -3.5355 2.8284 0 -2.8284 1.5308 0 -3.6956 1.9135 0 -4.6195
  [4,16,3.5355,0,-3.5355,2.8284,0,-2.8284,1.5308,0,-3.6956,1.9135,0,-4.6195],
// 4 16 4.6195 0 -1.9135 3.6956 0 -1.5308 2.8284 0 -2.8284 3.5355 0 -3.5355
  [4,16,4.6195,0,-1.9135,3.6956,0,-1.5308,2.8284,0,-2.8284,3.5355,0,-3.5355],
// 4 16 5 0 0 4 0 0 3.6956 0 -1.5308 4.6195 0 -1.9135
  [4,16,5,0,0,4,0,0,3.6956,0,-1.5308,4.6195,0,-1.9135],
// 4 16 4.6195 0 1.9135 3.6956 0 1.5308 4 0 0 5 0 0
  [4,16,4.6195,0,1.9135,3.6956,0,1.5308,4,0,0,5,0,0],
// 4 16 3.5355 0 3.5355 2.8284 0 2.8284 3.6956 0 1.5308 4.6195 0 1.9135
  [4,16,3.5355,0,3.5355,2.8284,0,2.8284,3.6956,0,1.5308,4.6195,0,1.9135],
// 4 16 1.9135 0 4.6195 1.5308 0 3.6956 2.8284 0 2.8284 3.5355 0 3.5355
  [4,16,1.9135,0,4.6195,1.5308,0,3.6956,2.8284,0,2.8284,3.5355,0,3.5355],
// 4 16 0 0 5 0 0 4 1.5308 0 3.6956 1.9135 0 4.6195
  [4,16,0,0,5,0,0,4,1.5308,0,3.6956,1.9135,0,4.6195],
// 0
];
module ldraw_lib__4_4ring4(step=0, col=false, unit=2/5, alt=false, line=0.2, solid=!$preview)
    makepoly(ldraw_lib__4_4ring4(solid), step=step, col=col, unit=unit, alt=alt, line=line, solid=solid);
ldraw_lib__4_4ring4(line=0.2);
// file: ../p/4-4cylo.scad
use <../lib.scad>
use <4-4cyli.scad>
use <4-4edge.scad>
$fa=1; $fs=0.2;
function ldraw_lib__4_4cylo(realsolid=false) = [
// 0 Cylinder Open 1.0
// 0 Name: 4-4cylo.dat
// 0 Author: Mark Kennedy [mkennedy]
// 0 !LDRAW_ORG Primitive UPDATE 2010-01
// 0 !LICENSE Licensed under CC BY 2.0 and CC BY 4.0 : see CAreadme.txt
// 
// 0 BFC CERTIFY CCW
  [0,"BFC","CERTIFY"],
  [0,"BFC","CCW"],
// 
// 0 !HISTORY 2010-04-05 [PTadmin] Official Update 2010-01
// 
// 
// 1 16 0 0 0 1 0 0 0 1 0 0 0 1 4-4edge.dat
  [1,16,0,0,0,1,0,0,0,1,0,0,0,1, ldraw_lib__4_4edge(realsolid)],
// 1 16 0 1 0 1 0 0 0 1 0 0 0 1 4-4edge.dat
  [1,16,0,1,0,1,0,0,0,1,0,0,0,1, ldraw_lib__4_4edge(realsolid)],
// 1 16 0 0 0 1 0 0 0 1 0 0 0 1 4-4cyli.dat
  [1,16,0,0,0,1,0,0,0,1,0,0,0,1, ldraw_lib__4_4cyli(realsolid)],
// 0
];
module ldraw_lib__4_4cylo(step=0, col=false, unit=2/5, alt=false, line=0.2, solid=!$preview)
    makepoly(ldraw_lib__4_4cylo(solid), step=step, col=col, unit=unit, alt=alt, line=line, solid=solid);
ldraw_lib__4_4cylo(line=0.2);
// file: ../p/4-4con4.scad
use <../lib.scad>
$fa=1; $fs=0.2;
function ldraw_lib__4_4con4(realsolid=false) = [
// 0 Cone  4 x 1.0
// 0 Name: 4-4con4.dat
// 0 Author: John Riley [jriley]
// 0 !LDRAW_ORG Primitive UPDATE 2012-01
// 0 !LICENSE Licensed under CC BY 2.0 and CC BY 4.0 : see CAreadme.txt
// 
// 0 BFC CERTIFY CCW
  [0,"BFC","CERTIFY"],
  [0,"BFC","CCW"],
// 
// 0 !HISTORY 2003-08-01 [PTadmin] Official Update 2003-02
// 0 !HISTORY 2007-06-24 [PTadmin] Header formatted for Contributor Agreement
// 0 !HISTORY 2008-07-01 [PTadmin] Official Update 2008-01
// 0 !HISTORY 2012-02-16 [Philo] Changed to CCW
// 0 !HISTORY 2012-03-30 [PTadmin] Official Update 2012-01
// 
// 
// 4 16 3.6956 1 1.5308 4.6195 0 1.9135 5 0 0 4 1 0
  [4,16,3.6956,1,1.5308,4.6195,0,1.9135,5,0,0,4,1,0],
// 4 16 2.8284 1 2.8284 3.5355 0 3.5355 4.6195 0 1.9135 3.6956 1 1.5308
  [4,16,2.8284,1,2.8284,3.5355,0,3.5355,4.6195,0,1.9135,3.6956,1,1.5308],
// 4 16 1.5308 1 3.6956 1.9135 0 4.6195 3.5355 0 3.5355 2.8284 1 2.8284
  [4,16,1.5308,1,3.6956,1.9135,0,4.6195,3.5355,0,3.5355,2.8284,1,2.8284],
// 4 16 0 1 4 0 0 5 1.9135 0 4.6195 1.5308 1 3.6956
  [4,16,0,1,4,0,0,5,1.9135,0,4.6195,1.5308,1,3.6956],
// 4 16 -1.5308 1 3.6956 -1.9135 0 4.6195 0 0 5 0 1 4
  [4,16,-1.5308,1,3.6956,-1.9135,0,4.6195,0,0,5,0,1,4],
// 4 16 -2.8284 1 2.8284 -3.5355 0 3.5355 -1.9135 0 4.6195 -1.5308 1 3.6956
  [4,16,-2.8284,1,2.8284,-3.5355,0,3.5355,-1.9135,0,4.6195,-1.5308,1,3.6956],
// 4 16 -3.6956 1 1.5308 -4.6195 0 1.9135 -3.5355 0 3.5355 -2.8284 1 2.8284
  [4,16,-3.6956,1,1.5308,-4.6195,0,1.9135,-3.5355,0,3.5355,-2.8284,1,2.8284],
// 4 16 -4 1 0 -5 0 0 -4.6195 0 1.9135 -3.6956 1 1.5308
  [4,16,-4,1,0,-5,0,0,-4.6195,0,1.9135,-3.6956,1,1.5308],
// 4 16 -3.6956 1 -1.5308 -4.6195 0 -1.9135 -5 0 0 -4 1 0
  [4,16,-3.6956,1,-1.5308,-4.6195,0,-1.9135,-5,0,0,-4,1,0],
// 4 16 -2.8284 1 -2.8284 -3.5355 0 -3.5355 -4.6195 0 -1.9135 -3.6956 1 -1.5308
  [4,16,-2.8284,1,-2.8284,-3.5355,0,-3.5355,-4.6195,0,-1.9135,-3.6956,1,-1.5308],
// 4 16 -1.5308 1 -3.6956 -1.9135 0 -4.6195 -3.5355 0 -3.5355 -2.8284 1 -2.8284
  [4,16,-1.5308,1,-3.6956,-1.9135,0,-4.6195,-3.5355,0,-3.5355,-2.8284,1,-2.8284],
// 4 16 0 1 -4 0 0 -5 -1.9135 0 -4.6195 -1.5308 1 -3.6956
  [4,16,0,1,-4,0,0,-5,-1.9135,0,-4.6195,-1.5308,1,-3.6956],
// 4 16 1.5308 1 -3.6956 1.9135 0 -4.6195 0 0 -5 0 1 -4
  [4,16,1.5308,1,-3.6956,1.9135,0,-4.6195,0,0,-5,0,1,-4],
// 4 16 2.8284 1 -2.8284 3.5355 0 -3.5355 1.9135 0 -4.6195 1.5308 1 -3.6956
  [4,16,2.8284,1,-2.8284,3.5355,0,-3.5355,1.9135,0,-4.6195,1.5308,1,-3.6956],
// 4 16 3.6956 1 -1.5308 4.6195 0 -1.9135 3.5355 0 -3.5355 2.8284 1 -2.8284
  [4,16,3.6956,1,-1.5308,4.6195,0,-1.9135,3.5355,0,-3.5355,2.8284,1,-2.8284],
// 4 16 4 1 0 5 0 0 4.6195 0 -1.9135 3.6956 1 -1.5308
  [4,16,4,1,0,5,0,0,4.6195,0,-1.9135,3.6956,1,-1.5308],
// 
// 5 24 4 1 0 5 0 0 3.6956 1 -1.5308 3.6956 1 1.5308
  [5,24,4,1,0,5,0,0,3.6956,1,-1.5308,3.6956,1,1.5308],
// 5 24 3.6956 1 1.5308 4.6195 0 1.9135 4 1 0 2.8284 1 2.8284
  [5,24,3.6956,1,1.5308,4.6195,0,1.9135,4,1,0,2.8284,1,2.8284],
// 5 24 2.8284 1 2.8284 3.5355 0 3.5355 3.6956 1 1.5308 1.5308 1 3.6956
  [5,24,2.8284,1,2.8284,3.5355,0,3.5355,3.6956,1,1.5308,1.5308,1,3.6956],
// 5 24 1.5308 1 3.6956 1.9135 0 4.6195 2.8284 1 2.8284 0 1 4
  [5,24,1.5308,1,3.6956,1.9135,0,4.6195,2.8284,1,2.8284,0,1,4],
// 5 24 0 1 4 0 0 5 1.5308 1 3.6956 -1.5308 1 3.6956
  [5,24,0,1,4,0,0,5,1.5308,1,3.6956,-1.5308,1,3.6956],
// 5 24 -1.5308 1 3.6956 -1.9135 0 4.6195 0 1 4 -2.8284 1 2.8284
  [5,24,-1.5308,1,3.6956,-1.9135,0,4.6195,0,1,4,-2.8284,1,2.8284],
// 5 24 -2.8284 1 2.8284 -3.5355 0 3.5355 -1.5308 1 3.6956 -3.6956 1 1.5308
  [5,24,-2.8284,1,2.8284,-3.5355,0,3.5355,-1.5308,1,3.6956,-3.6956,1,1.5308],
// 5 24 -3.6956 1 1.5308 -4.6195 0 1.9135 -2.8284 1 2.8284 -4 1 0
  [5,24,-3.6956,1,1.5308,-4.6195,0,1.9135,-2.8284,1,2.8284,-4,1,0],
// 5 24 -4 1 0 -5 0 0 -3.6956 1 1.5308 -3.6956 1 -1.5308
  [5,24,-4,1,0,-5,0,0,-3.6956,1,1.5308,-3.6956,1,-1.5308],
// 5 24 -3.6956 1 -1.5308 -4.6195 0 -1.9135 -4 1 0 -2.8284 1 -2.8284
  [5,24,-3.6956,1,-1.5308,-4.6195,0,-1.9135,-4,1,0,-2.8284,1,-2.8284],
// 5 24 -2.8284 1 -2.8284 -3.5355 0 -3.5355 -3.6956 1 -1.5308 -1.5308 1 -3.6956
  [5,24,-2.8284,1,-2.8284,-3.5355,0,-3.5355,-3.6956,1,-1.5308,-1.5308,1,-3.6956],
// 5 24 -1.5308 1 -3.6956 -1.9135 0 -4.6195 -2.8284 1 -2.8284 0 1 -4
  [5,24,-1.5308,1,-3.6956,-1.9135,0,-4.6195,-2.8284,1,-2.8284,0,1,-4],
// 5 24 0 1 -4 0 0 -5 -1.5308 1 -3.6956 1.5308 1 -3.6956
  [5,24,0,1,-4,0,0,-5,-1.5308,1,-3.6956,1.5308,1,-3.6956],
// 5 24 1.5308 1 -3.6956 1.9135 0 -4.6195 0 1 -4 2.8284 1 -2.8284
  [5,24,1.5308,1,-3.6956,1.9135,0,-4.6195,0,1,-4,2.8284,1,-2.8284],
// 5 24 2.8284 1 -2.8284 3.5355 0 -3.5355 1.5308 1 -3.6956 3.6956 1 -1.5308
  [5,24,2.8284,1,-2.8284,3.5355,0,-3.5355,1.5308,1,-3.6956,3.6956,1,-1.5308],
// 5 24 3.6956 1 -1.5308 4.6195 0 -1.9135 2.8284 1 -2.8284 4 1 0
  [5,24,3.6956,1,-1.5308,4.6195,0,-1.9135,2.8284,1,-2.8284,4,1,0],
];
module ldraw_lib__4_4con4(step=0, col=false, unit=2/5, alt=false, line=0.2, solid=!$preview)
    makepoly(ldraw_lib__4_4con4(solid), step=step, col=col, unit=unit, alt=alt, line=line, solid=solid);
ldraw_lib__4_4con4(line=0.2);
// main file
use <../lib.scad>
use <../p/4-4con4.scad>
use <../p/4-4cylo.scad>
use <../p/4-4ring4.scad>
use <../p/4-4ring8.scad>
$fa=1; $fs=0.2;
function ldraw_lib__u9404(realsolid=false) = [
// 0 ~Electric Powered Up Colour Sensor Inner Ring
// 0 Name: u9404.dat
// 0 Author: Philippe Hurbain [Philo]
// 0 !LDRAW_ORG Part UPDATE 2020-03
// 0 !LICENSE Licensed under CC BY 2.0 and CC BY 4.0 : see CAreadme.txt
// 
// 0 BFC CERTIFY CCW
  [0,"BFC","CERTIFY"],
  [0,"BFC","CCW"],
// 
// 0 !KEYWORDS Mindstorms, Robot Inventor, Spike Prime
// 
// 0 !HISTORY 2019-06-28 [PTadmin] Official Update 2019-01
// 0 !HISTORY 2020-12-27 [PTadmin] Update description
// 0 !HISTORY 2020-12-29 [PTadmin] Official Update 2020-03
// 
// 
// 0 BFC INVERTNEXT
  [0,"BFC","INVERTNEXT"],
// 1 16 0 0 0 7.8 0 0 0 0 7.8 0 -6 0 4-4cylo.dat
  [1,16,0,0,0,7.8,0,0,0,0,7.8,0,-6,0, ldraw_lib__4_4cylo(realsolid)],
// 1 16 0 0 -6 0.975 0 0 0 0 0.975 0 6 0 4-4ring8.dat
  [1,16,0,0,-6,0.975,0,0,0,0,0.975,0,6,0, ldraw_lib__4_4ring8(realsolid)],
// 0 BFC INVERTNEXT
  [0,"BFC","INVERTNEXT"],
// 1 16 0 0 -8 2.19375 0 0 0 0 2.19375 0 1 0 4-4con4.dat
  [1,16,0,0,-8,2.19375,0,0,0,0,2.19375,0,1,0, ldraw_lib__4_4con4(realsolid)],
// 1 16 0 0 0 10.96875 0 0 0 0 10.96875 0 -8 0 4-4cylo.dat
  [1,16,0,0,0,10.96875,0,0,0,0,10.96875,0,-8,0, ldraw_lib__4_4cylo(realsolid)],
// 0 BFC INVERTNEXT
  [0,"BFC","INVERTNEXT"],
// 1 16 0 0 -7 8.775 0 0 0 0 8.775 0 1 0 4-4cylo.dat
  [1,16,0,0,-7,8.775,0,0,0,0,8.775,0,1,0, ldraw_lib__4_4cylo(realsolid)],
// 1 16 0 0 0 0.975 0 0 0 0 0.975 0 -6 0 4-4ring8.dat
  [1,16,0,0,0,0.975,0,0,0,0,0.975,0,-6,0, ldraw_lib__4_4ring8(realsolid)],
// 1 16 0 0 0 2.19375 0 0 0 0 2.19375 0 -1 0 4-4ring4.dat
  [1,16,0,0,0,2.19375,0,0,0,0,2.19375,0,-1,0, ldraw_lib__4_4ring4(realsolid)],
];
module ldraw_lib__u9404(step=0, col=false, unit=2/5, alt=false, line=0.2, solid=!$preview)
    makepoly(ldraw_lib__u9404(solid), step=step, col=col, unit=unit, alt=alt, line=line, solid=solid);
ldraw_lib__u9404(line=0.2);
